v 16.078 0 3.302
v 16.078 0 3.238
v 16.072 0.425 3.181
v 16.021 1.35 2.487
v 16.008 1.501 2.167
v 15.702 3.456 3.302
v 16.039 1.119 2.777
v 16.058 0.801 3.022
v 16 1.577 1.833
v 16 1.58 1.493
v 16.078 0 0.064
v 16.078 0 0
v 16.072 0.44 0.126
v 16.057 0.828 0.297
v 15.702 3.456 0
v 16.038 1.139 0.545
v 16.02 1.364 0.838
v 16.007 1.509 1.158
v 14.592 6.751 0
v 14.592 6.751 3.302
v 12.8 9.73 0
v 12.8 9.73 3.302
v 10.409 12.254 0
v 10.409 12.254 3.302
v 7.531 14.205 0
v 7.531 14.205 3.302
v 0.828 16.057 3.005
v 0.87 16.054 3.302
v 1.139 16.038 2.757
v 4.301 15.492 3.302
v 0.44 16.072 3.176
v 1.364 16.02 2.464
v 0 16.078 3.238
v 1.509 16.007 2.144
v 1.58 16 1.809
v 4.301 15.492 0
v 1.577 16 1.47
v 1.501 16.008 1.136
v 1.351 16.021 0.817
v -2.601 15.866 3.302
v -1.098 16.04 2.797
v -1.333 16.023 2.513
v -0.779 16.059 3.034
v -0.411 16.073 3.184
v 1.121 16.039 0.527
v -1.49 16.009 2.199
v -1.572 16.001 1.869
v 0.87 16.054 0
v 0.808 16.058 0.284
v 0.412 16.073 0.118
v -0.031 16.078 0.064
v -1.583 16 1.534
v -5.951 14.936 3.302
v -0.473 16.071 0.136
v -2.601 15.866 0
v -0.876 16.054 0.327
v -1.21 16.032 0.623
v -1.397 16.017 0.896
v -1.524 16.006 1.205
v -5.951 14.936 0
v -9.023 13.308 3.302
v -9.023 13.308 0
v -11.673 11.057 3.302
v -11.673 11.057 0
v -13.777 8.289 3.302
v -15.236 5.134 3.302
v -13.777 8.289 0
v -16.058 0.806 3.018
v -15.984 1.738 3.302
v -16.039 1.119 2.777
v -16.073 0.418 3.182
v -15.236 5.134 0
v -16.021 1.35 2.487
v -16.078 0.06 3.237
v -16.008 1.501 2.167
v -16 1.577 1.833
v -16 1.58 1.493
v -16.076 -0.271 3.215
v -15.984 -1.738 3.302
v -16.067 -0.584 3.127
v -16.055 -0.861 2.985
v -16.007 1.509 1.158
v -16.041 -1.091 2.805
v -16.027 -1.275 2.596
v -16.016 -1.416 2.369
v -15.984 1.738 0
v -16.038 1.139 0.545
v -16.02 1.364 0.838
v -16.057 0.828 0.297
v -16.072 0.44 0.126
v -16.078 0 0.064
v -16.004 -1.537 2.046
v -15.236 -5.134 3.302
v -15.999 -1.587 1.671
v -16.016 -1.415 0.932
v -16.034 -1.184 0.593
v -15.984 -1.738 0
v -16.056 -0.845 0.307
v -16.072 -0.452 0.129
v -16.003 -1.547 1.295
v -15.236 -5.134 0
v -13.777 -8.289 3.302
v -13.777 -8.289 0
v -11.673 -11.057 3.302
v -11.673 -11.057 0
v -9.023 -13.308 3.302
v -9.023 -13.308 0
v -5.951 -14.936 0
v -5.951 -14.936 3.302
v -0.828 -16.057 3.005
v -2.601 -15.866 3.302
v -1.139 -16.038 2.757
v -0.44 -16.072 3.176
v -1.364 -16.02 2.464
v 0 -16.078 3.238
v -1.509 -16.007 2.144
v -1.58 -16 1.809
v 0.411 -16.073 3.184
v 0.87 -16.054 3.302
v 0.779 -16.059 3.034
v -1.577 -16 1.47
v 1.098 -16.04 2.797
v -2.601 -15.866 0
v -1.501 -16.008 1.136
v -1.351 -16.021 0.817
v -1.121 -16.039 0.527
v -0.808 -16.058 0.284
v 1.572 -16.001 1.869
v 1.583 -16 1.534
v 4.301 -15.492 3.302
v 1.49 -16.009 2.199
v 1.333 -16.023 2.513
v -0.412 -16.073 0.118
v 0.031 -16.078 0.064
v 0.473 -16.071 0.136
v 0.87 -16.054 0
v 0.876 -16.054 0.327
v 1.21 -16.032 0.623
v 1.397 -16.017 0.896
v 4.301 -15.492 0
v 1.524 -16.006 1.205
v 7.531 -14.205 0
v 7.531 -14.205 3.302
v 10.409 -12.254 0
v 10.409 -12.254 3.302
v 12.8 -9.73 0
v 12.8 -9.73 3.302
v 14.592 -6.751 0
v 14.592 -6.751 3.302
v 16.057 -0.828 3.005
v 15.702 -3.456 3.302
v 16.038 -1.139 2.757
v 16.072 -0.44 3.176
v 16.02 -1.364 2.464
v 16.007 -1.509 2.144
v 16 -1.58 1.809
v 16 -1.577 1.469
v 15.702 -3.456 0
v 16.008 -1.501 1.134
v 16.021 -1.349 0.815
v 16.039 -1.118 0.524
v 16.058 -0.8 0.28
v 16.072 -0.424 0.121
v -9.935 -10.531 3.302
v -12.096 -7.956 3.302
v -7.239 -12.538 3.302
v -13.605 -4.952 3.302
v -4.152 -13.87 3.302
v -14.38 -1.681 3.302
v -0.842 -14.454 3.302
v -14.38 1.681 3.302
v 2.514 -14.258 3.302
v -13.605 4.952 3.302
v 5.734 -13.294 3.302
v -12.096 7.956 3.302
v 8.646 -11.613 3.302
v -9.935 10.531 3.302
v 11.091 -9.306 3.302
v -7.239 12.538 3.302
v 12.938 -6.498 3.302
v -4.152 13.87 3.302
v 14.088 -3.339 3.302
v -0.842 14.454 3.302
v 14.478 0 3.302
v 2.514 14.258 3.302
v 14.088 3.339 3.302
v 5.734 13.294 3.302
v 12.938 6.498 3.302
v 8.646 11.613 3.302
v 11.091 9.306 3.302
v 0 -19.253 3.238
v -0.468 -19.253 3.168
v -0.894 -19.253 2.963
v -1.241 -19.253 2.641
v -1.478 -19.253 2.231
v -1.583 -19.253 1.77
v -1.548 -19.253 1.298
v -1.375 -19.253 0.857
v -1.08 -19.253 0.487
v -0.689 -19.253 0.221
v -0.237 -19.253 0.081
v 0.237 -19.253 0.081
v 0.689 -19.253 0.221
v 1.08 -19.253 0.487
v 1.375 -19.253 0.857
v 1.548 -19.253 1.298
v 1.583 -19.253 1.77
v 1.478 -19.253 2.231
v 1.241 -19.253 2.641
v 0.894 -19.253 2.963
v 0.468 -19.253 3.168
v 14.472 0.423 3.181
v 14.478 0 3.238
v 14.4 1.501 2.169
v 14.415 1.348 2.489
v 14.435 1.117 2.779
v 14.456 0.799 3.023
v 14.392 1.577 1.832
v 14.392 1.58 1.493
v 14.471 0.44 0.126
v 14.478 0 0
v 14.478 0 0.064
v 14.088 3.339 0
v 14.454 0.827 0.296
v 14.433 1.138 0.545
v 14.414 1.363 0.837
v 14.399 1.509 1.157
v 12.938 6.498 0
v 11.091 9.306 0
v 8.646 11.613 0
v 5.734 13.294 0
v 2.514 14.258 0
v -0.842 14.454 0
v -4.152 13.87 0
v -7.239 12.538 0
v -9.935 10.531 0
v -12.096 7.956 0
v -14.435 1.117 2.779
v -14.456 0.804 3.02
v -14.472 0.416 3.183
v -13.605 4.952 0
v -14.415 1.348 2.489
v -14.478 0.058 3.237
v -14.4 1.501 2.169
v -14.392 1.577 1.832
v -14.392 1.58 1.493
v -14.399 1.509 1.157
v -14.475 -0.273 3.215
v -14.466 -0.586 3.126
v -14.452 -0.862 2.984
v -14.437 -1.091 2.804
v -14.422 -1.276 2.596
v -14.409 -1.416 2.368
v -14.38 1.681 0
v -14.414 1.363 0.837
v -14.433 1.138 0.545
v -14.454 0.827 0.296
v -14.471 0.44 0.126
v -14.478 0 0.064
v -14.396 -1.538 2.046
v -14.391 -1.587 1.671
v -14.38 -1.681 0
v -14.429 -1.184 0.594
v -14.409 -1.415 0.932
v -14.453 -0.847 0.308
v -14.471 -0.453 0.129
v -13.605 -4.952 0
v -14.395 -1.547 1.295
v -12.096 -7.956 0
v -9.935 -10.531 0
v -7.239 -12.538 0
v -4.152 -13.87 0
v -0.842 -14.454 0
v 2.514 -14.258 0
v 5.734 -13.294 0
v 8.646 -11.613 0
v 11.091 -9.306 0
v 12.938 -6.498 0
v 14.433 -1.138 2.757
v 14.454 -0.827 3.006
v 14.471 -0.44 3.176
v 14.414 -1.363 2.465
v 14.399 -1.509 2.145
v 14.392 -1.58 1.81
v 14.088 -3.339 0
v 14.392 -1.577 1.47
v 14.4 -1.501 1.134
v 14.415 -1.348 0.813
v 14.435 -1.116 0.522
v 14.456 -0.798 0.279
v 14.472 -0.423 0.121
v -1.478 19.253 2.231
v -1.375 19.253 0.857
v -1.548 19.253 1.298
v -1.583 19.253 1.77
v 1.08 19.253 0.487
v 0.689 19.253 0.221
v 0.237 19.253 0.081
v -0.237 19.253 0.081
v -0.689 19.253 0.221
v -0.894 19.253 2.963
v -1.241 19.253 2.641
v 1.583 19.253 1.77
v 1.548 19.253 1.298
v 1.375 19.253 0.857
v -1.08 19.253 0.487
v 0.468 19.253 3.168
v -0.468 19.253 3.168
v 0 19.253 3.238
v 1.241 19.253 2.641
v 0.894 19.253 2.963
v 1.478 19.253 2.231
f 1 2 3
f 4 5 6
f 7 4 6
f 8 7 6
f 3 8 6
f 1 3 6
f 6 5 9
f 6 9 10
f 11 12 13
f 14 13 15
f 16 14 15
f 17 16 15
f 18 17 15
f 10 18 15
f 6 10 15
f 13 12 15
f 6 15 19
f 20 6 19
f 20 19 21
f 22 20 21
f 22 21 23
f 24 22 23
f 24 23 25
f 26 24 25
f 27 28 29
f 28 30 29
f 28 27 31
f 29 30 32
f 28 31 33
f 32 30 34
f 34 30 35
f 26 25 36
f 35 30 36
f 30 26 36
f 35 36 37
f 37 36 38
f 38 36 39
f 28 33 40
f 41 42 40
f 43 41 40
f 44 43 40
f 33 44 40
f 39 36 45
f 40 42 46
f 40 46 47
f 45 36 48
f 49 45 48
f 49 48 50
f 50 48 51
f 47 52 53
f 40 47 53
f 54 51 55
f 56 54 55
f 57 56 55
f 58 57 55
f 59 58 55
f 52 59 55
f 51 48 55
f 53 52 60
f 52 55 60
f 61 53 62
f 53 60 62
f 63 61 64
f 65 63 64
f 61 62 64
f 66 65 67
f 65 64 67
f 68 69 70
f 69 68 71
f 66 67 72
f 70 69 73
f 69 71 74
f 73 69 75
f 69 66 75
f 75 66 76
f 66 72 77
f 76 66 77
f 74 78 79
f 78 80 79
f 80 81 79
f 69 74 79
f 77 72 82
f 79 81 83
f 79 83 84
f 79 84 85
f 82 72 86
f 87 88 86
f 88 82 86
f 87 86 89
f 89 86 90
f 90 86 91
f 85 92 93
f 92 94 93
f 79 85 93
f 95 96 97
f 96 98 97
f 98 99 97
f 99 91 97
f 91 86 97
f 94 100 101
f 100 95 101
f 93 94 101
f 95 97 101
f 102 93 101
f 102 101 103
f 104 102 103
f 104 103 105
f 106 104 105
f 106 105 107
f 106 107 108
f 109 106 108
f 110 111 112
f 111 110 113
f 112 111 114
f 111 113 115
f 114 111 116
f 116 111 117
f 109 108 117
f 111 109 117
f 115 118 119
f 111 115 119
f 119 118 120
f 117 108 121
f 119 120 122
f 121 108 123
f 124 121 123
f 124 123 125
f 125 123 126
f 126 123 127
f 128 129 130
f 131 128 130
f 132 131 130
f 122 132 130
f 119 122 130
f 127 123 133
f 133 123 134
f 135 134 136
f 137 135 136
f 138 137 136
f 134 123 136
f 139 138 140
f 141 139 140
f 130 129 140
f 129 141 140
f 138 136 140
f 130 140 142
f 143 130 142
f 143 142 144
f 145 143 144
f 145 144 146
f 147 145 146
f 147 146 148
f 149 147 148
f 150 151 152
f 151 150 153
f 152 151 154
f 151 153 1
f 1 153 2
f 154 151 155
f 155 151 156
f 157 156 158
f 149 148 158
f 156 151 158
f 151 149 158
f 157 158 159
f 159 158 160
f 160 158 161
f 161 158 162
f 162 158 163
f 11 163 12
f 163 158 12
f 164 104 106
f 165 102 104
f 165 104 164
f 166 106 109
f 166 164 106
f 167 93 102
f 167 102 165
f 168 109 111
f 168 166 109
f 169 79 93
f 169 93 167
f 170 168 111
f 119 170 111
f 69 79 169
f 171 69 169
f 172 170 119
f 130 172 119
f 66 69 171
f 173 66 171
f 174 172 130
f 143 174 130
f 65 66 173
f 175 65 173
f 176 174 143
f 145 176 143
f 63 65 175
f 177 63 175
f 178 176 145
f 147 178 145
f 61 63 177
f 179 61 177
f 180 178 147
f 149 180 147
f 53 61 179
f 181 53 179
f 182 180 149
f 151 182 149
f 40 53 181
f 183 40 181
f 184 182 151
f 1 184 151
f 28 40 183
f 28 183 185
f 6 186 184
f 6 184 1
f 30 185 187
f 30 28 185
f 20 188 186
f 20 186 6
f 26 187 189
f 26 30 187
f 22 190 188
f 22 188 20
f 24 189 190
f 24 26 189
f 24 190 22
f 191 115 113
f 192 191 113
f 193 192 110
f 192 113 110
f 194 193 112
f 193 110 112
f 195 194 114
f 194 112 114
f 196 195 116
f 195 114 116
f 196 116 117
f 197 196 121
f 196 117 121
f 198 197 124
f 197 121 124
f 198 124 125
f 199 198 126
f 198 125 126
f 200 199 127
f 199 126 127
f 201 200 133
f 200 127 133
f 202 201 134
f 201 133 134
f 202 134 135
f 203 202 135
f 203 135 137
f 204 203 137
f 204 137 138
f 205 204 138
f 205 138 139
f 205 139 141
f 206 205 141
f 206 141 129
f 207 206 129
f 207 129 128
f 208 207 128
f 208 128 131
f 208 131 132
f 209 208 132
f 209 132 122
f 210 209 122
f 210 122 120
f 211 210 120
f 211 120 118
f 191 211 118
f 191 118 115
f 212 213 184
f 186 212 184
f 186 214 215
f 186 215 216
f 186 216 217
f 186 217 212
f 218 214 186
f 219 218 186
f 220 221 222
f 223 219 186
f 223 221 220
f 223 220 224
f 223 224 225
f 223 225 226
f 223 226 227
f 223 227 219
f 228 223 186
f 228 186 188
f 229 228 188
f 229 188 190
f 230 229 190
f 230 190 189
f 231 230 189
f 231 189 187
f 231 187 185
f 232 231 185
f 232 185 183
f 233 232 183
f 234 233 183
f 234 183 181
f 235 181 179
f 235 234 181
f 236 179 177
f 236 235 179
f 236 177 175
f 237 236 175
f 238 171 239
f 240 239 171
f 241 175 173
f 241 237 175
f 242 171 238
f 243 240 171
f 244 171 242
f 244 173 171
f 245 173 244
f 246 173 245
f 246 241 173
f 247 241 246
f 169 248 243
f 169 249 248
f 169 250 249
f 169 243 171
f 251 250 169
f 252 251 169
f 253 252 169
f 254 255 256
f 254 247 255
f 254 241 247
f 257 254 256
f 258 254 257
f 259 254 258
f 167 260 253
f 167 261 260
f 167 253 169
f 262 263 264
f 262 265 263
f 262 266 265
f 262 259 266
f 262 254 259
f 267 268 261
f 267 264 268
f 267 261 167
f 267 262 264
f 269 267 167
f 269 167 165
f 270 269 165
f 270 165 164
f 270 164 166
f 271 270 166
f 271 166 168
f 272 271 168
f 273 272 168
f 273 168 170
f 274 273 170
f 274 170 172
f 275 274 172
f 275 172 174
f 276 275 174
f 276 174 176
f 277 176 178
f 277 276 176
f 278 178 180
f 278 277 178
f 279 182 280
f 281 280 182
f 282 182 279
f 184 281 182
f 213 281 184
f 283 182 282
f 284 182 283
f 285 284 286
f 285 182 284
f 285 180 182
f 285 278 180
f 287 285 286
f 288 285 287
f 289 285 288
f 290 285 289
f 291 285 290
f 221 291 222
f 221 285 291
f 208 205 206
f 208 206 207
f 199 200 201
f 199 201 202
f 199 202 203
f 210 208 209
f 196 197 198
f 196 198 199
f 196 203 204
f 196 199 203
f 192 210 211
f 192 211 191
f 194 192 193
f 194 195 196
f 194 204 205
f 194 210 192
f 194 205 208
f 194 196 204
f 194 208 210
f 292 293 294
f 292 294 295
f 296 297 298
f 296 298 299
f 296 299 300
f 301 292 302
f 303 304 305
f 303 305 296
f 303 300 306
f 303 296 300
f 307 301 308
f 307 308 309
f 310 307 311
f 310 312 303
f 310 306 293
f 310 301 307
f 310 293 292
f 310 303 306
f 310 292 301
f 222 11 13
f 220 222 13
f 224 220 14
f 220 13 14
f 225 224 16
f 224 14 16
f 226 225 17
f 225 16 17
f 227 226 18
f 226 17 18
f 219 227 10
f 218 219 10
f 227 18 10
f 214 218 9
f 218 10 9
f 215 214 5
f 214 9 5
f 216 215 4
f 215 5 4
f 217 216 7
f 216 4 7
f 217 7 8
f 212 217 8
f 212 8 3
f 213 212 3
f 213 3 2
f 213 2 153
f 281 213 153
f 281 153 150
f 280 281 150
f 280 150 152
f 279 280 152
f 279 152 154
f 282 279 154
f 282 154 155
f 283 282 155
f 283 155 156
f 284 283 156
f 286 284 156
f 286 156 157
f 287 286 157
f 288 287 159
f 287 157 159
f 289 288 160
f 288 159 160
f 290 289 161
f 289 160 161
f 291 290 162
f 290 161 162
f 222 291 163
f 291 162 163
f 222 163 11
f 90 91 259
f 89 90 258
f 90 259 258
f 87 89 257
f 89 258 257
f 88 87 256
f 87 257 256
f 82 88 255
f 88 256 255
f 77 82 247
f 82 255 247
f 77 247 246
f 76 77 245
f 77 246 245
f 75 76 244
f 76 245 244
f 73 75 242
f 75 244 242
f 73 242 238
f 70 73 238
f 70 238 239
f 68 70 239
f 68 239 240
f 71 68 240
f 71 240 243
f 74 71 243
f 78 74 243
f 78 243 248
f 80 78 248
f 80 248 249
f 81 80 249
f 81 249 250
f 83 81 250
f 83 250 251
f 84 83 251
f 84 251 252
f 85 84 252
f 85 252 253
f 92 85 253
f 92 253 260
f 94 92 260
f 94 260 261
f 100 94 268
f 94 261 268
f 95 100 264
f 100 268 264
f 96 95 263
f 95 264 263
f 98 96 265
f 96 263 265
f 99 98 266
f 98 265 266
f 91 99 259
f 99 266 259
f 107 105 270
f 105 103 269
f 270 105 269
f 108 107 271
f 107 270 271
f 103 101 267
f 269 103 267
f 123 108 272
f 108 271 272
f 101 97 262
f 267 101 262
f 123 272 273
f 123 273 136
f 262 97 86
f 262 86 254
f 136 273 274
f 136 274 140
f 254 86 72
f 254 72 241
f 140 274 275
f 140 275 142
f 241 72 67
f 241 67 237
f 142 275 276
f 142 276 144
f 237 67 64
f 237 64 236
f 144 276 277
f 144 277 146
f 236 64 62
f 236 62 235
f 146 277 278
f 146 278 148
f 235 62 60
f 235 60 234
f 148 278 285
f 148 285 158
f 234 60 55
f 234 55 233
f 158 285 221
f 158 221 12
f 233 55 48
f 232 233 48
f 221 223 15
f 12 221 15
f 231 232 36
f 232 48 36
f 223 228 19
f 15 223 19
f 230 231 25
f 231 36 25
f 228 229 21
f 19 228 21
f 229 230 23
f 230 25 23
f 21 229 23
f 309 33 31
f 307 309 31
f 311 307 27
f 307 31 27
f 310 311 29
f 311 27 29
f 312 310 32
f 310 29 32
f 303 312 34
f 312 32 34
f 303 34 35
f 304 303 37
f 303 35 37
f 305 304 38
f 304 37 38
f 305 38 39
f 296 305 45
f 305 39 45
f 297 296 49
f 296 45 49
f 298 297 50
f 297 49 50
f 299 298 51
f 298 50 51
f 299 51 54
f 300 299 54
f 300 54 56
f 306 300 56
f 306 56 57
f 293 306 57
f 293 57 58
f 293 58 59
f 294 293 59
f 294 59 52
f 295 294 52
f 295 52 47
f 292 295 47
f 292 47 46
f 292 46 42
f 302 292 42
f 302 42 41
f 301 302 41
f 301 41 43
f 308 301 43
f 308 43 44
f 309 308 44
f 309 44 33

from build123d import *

# Parameters (mm, degrees)
SKETCH1_R           = 16.078
SKETCH1_R_2         = 14.478
BOSS_EXTRUDE1_DEPTH = 3.302
SKETCH2_R           = 1.5875
CUT_EXTRUDE1_DEPTH  = 33.156
BOSS_EXTRUDE2_START = -0.635
SKETCH3_R           = 1.5875
BOSS_EXTRUDE2_DEPTH = 3.81
CIRPATTERN1_COUNT   = 2


with BuildPart() as part:
    # Sketch1 → Boss-Extrude1 (new body)
    with BuildSketch(Plane.XY):
        Circle(SKETCH1_R)
        Circle(SKETCH1_R_2, mode=Mode.SUBTRACT)
    extrude(amount=BOSS_EXTRUDE1_DEPTH)

    # Sketch2 → Cut-Extrude1 (cut, through all)
    with BuildSketch(Plane(origin=(16.078, 0, 0), x_dir=(0, 0, -1), z_dir=(1, 0, 0))):
        with Locations((-1.651, 0)):
            Circle(SKETCH2_R)
    extrude(amount=-CUT_EXTRUDE1_DEPTH, mode=Mode.SUBTRACT)

    # Sketch3 → Boss-Extrude2 (add)
    with BuildSketch(Plane(origin=(0, 16.078, 0), x_dir=(-1, 0, 0), z_dir=(0, 1, 0)).offset(BOSS_EXTRUDE2_START)):
        with Locations(Location((0, 1.651, 0), (0, 0, 90))):  # turned: the seam where the file's is
            Circle(SKETCH3_R)
    boss_extrude2 = extrude(amount=BOSS_EXTRUDE2_DEPTH)

    # CirPattern1: Boss-Extrude2 ×2 about axis
    cirpattern1_axis = Axis((0, 0, 3.302), (0, 0, -1))
    for i in range(1, CIRPATTERN1_COUNT):
        add(boss_extrude2.rotate(cirpattern1_axis, i * 360 / CIRPATTERN1_COUNT))


solid = part.part
